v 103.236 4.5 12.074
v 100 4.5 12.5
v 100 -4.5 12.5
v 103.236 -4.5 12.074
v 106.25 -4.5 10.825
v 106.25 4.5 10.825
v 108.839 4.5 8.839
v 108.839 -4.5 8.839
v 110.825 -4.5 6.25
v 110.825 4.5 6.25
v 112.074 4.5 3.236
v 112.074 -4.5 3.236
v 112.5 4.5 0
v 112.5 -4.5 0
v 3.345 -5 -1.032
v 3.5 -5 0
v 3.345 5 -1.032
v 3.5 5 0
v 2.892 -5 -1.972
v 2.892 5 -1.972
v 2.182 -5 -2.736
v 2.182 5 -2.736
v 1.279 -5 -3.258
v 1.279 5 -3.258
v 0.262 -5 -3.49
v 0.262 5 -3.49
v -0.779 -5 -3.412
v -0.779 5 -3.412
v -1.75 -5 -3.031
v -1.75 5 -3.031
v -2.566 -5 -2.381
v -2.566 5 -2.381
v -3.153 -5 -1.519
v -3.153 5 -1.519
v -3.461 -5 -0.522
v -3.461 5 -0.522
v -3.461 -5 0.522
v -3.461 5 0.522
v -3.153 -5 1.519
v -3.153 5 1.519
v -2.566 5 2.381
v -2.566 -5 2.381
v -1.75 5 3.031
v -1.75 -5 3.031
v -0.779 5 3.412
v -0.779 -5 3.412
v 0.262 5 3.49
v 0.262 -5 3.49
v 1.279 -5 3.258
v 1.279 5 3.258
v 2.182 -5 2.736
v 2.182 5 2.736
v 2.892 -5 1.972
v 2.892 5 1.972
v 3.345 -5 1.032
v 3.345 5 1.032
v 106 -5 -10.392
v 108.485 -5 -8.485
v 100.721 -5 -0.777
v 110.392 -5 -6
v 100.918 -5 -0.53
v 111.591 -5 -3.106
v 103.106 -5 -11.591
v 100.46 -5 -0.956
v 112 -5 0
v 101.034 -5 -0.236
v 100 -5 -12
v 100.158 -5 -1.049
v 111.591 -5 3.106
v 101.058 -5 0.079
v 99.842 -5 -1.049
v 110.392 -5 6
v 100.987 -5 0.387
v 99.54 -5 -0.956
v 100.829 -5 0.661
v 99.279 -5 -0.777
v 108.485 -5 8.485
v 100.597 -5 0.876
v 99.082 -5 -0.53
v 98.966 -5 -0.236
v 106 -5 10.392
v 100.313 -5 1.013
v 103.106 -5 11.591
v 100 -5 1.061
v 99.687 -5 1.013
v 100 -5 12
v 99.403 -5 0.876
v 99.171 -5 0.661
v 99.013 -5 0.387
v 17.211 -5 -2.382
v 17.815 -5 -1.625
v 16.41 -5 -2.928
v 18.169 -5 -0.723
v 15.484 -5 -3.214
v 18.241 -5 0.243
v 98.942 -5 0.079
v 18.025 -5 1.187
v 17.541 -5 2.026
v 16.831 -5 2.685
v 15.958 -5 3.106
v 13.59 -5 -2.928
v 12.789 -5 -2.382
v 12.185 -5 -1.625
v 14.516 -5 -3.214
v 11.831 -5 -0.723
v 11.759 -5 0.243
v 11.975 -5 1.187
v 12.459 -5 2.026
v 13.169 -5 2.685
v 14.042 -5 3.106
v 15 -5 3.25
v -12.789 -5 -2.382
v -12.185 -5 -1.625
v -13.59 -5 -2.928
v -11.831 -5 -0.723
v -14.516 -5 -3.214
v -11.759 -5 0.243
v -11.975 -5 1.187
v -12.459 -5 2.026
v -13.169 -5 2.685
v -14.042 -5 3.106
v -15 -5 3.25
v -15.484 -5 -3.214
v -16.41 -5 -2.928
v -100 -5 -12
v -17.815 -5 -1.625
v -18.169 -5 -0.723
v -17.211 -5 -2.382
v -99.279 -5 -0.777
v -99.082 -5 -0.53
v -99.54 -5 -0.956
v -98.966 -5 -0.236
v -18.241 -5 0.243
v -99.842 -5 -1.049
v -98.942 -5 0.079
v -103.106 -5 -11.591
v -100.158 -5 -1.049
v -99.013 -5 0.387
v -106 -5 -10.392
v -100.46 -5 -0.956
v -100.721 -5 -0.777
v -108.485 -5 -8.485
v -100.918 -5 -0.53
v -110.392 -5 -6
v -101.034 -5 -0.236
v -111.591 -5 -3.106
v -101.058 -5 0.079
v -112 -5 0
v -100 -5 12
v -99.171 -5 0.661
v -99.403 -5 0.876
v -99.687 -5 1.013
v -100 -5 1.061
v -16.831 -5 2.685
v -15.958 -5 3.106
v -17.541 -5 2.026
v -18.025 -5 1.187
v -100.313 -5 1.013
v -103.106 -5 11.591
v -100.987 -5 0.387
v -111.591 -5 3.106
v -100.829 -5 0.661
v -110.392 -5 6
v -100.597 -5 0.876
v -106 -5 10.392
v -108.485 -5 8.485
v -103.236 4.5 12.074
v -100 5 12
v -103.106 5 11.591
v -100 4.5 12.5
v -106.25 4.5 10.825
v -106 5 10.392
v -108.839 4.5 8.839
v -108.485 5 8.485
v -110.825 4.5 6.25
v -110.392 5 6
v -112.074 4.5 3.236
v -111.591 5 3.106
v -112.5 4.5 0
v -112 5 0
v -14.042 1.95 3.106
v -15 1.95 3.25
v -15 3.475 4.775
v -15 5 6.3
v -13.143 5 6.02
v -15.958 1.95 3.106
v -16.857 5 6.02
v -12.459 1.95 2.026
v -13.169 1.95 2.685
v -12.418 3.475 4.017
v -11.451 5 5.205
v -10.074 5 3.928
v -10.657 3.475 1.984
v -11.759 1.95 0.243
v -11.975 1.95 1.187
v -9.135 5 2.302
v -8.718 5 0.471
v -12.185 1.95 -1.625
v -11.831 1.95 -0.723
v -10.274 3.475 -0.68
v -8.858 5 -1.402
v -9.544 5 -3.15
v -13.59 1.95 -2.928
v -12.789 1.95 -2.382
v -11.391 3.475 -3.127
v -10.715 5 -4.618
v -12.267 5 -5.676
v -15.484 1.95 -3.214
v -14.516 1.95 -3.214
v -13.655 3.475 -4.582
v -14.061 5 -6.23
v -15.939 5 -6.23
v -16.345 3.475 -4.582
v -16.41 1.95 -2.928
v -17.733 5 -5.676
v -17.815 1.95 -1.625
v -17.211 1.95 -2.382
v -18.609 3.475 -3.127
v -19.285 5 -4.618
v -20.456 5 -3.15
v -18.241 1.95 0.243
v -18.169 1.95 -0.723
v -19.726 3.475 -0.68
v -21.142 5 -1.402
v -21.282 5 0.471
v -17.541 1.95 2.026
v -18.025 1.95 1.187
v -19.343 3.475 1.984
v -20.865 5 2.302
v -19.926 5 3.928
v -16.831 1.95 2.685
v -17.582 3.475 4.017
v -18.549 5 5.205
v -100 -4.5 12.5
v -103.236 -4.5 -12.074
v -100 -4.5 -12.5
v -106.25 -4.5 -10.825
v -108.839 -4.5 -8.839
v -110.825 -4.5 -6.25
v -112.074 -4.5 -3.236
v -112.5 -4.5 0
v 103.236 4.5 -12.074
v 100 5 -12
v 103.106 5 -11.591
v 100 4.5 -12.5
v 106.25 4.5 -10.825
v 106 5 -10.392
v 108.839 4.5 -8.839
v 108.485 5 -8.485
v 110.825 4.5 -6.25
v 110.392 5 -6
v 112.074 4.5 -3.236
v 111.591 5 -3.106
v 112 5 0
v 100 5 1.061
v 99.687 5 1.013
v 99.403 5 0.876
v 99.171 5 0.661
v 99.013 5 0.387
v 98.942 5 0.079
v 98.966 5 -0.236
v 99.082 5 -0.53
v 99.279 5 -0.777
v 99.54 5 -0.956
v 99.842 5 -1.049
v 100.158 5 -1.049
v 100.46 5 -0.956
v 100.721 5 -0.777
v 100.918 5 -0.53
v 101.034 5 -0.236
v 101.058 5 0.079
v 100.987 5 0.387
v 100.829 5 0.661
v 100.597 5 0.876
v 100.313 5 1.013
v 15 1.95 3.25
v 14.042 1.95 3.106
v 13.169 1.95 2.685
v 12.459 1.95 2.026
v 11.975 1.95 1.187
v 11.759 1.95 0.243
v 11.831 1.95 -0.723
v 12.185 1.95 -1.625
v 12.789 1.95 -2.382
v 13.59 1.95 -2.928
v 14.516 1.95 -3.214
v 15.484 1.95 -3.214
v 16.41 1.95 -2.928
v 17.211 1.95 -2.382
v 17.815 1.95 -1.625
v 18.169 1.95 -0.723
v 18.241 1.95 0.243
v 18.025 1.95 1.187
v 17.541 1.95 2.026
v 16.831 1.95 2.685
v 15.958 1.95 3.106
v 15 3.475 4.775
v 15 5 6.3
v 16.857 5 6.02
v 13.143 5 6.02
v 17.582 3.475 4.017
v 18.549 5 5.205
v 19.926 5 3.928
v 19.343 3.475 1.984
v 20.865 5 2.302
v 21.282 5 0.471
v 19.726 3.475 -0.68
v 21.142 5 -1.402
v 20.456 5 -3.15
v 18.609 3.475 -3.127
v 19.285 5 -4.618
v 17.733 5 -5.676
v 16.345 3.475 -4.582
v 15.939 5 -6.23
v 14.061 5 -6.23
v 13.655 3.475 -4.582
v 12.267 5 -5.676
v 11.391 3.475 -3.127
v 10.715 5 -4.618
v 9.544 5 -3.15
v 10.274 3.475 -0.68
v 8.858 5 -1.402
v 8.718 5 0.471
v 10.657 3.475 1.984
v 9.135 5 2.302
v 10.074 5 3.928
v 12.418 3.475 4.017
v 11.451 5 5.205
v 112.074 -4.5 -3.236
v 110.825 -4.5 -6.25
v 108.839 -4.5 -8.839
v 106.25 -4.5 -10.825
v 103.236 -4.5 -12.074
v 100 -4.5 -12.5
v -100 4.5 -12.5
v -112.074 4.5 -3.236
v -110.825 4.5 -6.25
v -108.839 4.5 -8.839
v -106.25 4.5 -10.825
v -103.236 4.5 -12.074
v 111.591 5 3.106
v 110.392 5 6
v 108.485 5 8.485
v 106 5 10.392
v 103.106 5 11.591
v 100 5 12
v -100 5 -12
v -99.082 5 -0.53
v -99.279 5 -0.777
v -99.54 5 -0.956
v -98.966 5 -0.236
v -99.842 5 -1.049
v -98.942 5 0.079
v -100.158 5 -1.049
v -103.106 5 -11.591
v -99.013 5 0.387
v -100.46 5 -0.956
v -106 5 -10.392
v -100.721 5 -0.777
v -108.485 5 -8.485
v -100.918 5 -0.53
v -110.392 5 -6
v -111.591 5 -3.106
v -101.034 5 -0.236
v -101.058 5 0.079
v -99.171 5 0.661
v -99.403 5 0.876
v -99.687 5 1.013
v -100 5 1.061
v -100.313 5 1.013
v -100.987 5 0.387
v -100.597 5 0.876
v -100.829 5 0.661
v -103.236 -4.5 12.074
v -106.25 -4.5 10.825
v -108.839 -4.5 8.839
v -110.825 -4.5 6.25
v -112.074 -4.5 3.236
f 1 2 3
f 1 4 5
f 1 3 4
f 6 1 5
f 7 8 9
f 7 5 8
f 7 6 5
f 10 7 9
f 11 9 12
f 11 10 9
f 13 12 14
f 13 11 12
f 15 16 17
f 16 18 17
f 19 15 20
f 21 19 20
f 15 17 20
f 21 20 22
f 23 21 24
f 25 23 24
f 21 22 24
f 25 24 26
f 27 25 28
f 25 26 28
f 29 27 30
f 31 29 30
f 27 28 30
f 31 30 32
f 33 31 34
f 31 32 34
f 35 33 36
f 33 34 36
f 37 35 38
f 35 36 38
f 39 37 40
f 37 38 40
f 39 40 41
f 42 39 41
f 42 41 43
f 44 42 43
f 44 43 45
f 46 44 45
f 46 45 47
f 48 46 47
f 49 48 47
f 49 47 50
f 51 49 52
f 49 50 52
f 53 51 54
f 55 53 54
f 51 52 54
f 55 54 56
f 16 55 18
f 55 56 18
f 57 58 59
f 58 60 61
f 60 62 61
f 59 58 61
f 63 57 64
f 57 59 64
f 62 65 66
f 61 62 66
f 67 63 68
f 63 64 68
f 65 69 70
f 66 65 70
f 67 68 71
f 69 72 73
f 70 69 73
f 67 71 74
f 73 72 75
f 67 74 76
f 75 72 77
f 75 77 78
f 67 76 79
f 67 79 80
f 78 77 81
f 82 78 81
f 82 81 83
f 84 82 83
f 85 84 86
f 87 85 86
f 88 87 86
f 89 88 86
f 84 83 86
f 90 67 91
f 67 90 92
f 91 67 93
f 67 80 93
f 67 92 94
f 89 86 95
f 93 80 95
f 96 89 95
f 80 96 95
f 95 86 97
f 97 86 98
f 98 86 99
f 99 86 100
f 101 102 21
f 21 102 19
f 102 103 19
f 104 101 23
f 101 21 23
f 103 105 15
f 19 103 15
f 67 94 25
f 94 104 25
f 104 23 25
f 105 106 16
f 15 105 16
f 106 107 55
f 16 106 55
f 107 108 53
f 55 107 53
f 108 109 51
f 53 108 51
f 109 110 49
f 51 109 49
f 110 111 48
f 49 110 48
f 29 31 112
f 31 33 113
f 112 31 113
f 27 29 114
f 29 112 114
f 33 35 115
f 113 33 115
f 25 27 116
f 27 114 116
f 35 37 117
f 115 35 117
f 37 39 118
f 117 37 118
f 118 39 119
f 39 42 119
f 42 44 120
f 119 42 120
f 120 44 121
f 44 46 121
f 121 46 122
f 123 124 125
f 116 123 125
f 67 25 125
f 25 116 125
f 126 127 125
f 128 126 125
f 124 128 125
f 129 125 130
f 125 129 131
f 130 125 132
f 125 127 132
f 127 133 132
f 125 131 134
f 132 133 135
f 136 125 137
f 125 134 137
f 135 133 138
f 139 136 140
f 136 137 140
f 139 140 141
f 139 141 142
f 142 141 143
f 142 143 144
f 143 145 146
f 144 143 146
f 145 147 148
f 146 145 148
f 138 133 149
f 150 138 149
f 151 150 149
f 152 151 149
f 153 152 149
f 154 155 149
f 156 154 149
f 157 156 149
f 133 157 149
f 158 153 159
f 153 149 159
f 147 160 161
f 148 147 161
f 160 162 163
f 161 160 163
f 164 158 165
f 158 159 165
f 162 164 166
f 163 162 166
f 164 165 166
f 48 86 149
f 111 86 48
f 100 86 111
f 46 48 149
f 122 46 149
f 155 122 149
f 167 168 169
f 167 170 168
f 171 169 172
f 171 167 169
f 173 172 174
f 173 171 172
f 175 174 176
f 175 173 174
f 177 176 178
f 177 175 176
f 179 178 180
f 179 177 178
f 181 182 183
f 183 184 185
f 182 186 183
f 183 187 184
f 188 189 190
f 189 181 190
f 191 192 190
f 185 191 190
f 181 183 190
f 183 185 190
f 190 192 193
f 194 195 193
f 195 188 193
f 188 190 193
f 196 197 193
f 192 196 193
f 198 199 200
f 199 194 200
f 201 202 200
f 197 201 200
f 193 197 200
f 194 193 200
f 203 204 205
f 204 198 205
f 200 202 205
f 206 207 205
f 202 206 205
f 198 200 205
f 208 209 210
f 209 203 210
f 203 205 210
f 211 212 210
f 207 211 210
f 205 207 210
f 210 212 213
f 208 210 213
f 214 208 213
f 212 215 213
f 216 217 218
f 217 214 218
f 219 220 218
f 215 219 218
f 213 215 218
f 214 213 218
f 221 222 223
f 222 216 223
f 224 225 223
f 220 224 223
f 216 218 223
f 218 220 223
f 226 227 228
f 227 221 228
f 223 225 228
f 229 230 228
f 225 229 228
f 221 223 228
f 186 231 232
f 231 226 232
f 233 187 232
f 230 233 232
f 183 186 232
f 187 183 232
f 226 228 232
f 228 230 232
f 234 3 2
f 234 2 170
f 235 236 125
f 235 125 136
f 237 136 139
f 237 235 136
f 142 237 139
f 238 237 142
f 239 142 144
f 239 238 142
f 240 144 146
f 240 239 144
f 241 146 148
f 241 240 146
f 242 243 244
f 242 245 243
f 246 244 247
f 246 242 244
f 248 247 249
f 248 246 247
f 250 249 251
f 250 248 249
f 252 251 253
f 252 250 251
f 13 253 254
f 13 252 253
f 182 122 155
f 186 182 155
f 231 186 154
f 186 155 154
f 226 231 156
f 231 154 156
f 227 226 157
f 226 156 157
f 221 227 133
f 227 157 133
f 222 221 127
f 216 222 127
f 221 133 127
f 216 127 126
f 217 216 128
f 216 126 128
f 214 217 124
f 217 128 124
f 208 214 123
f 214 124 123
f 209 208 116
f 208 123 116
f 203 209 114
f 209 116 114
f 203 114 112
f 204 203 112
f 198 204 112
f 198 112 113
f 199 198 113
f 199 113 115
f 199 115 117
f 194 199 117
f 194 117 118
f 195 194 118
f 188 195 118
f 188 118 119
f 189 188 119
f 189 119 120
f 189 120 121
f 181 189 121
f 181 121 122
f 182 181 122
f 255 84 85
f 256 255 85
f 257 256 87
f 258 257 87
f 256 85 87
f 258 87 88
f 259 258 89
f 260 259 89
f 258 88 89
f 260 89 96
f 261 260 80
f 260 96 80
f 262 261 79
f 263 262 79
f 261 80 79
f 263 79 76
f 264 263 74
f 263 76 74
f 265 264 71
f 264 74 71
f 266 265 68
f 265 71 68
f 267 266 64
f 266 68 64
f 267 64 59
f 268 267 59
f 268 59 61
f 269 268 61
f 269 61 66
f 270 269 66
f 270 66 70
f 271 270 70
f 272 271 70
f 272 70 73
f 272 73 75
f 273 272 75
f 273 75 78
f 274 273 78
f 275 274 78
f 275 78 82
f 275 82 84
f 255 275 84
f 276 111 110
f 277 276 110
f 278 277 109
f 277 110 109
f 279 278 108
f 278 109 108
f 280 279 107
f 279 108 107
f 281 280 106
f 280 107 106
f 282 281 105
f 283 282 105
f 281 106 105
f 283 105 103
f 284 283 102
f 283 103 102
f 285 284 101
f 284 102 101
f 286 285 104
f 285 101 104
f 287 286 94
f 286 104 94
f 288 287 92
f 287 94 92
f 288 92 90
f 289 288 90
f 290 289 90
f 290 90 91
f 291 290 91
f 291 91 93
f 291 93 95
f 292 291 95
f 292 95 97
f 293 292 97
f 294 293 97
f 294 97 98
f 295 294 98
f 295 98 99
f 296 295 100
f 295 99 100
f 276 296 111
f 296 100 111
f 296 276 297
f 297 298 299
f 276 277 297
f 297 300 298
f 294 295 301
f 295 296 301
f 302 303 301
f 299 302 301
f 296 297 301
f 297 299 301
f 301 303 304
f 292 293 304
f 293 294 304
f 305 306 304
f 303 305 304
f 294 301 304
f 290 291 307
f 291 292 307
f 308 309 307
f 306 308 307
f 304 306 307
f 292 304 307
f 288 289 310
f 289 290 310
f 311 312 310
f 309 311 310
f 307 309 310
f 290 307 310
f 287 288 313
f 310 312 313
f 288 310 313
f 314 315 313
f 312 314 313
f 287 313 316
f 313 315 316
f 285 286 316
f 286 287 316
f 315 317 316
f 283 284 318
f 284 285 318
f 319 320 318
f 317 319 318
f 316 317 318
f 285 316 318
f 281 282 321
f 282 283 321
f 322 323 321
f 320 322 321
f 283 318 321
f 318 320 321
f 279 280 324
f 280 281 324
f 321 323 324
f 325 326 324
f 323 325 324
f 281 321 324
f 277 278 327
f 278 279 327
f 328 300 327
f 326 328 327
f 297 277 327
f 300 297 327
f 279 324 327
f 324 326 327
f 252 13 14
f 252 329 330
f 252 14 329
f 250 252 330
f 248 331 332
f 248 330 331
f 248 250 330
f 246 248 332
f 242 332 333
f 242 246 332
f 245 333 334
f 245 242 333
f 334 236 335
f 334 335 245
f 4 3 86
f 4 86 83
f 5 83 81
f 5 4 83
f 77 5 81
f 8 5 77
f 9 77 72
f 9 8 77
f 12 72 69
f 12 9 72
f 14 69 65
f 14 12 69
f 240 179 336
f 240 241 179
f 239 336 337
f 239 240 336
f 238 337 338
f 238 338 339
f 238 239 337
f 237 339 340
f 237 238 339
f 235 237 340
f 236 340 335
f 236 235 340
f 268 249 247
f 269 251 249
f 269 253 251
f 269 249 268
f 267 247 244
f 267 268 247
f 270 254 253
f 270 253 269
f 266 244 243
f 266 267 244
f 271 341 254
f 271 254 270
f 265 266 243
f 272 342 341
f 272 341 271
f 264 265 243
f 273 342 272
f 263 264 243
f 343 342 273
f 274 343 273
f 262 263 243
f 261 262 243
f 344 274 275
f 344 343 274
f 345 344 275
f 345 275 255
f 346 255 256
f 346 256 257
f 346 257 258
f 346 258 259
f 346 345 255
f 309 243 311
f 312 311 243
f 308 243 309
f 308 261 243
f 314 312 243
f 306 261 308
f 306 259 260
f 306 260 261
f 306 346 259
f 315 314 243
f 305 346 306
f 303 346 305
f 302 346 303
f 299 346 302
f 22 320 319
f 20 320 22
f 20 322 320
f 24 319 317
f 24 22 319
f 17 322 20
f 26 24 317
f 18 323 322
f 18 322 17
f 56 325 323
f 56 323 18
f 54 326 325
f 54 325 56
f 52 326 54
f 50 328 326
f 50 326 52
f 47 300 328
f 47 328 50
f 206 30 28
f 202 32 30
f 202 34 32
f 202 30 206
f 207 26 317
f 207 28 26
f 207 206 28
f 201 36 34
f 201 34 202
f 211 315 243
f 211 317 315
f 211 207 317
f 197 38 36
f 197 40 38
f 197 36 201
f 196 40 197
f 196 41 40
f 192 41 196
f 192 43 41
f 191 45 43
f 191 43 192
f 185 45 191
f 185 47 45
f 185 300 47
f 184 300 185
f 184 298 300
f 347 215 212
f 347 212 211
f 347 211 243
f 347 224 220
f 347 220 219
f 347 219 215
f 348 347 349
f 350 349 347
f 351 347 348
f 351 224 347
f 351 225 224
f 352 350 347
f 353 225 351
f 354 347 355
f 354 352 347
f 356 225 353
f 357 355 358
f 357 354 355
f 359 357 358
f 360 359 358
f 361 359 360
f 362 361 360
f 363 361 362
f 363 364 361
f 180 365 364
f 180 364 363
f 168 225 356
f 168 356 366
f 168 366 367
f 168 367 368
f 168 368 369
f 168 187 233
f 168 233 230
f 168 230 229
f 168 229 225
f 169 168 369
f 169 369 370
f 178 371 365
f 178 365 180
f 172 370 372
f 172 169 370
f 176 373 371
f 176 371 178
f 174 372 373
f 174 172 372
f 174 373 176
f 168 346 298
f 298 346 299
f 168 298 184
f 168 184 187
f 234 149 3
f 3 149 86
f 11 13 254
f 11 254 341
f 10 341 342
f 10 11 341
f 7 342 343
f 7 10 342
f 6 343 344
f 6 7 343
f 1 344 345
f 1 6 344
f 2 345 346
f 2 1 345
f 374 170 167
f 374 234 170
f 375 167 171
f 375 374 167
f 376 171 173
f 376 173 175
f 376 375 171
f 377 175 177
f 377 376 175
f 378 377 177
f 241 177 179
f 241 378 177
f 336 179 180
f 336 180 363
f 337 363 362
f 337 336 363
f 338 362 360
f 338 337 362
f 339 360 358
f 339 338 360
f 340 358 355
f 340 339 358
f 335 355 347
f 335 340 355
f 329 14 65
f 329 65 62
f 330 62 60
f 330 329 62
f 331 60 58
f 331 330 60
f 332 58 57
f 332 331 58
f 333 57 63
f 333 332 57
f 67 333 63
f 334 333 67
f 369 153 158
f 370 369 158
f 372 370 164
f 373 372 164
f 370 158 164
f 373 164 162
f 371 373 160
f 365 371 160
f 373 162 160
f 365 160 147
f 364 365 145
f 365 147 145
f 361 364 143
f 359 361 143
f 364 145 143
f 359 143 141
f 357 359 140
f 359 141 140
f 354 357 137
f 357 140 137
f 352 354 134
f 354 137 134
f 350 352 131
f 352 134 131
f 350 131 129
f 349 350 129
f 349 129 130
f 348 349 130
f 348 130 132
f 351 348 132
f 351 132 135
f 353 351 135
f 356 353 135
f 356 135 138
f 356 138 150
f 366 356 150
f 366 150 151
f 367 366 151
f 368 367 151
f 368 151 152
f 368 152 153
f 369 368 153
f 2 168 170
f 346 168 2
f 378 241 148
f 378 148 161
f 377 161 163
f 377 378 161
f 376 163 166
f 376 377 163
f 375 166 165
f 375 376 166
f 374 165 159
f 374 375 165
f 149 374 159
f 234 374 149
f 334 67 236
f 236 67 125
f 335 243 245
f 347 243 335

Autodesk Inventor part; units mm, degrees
ref_plane "YZ Plane" through (0, 0, 0) normal (1, 0, 0) x (0, 1, 0)
ref_plane "XZ Plane" through (0, 0, 0) normal (0, 1, 0) x (-1, 0, 0)
ref_plane "XY Plane" through (0, 0, 0) normal (0, 0, 1) x (1, 0, 0)
sketch "Sketch1" plane through (0, 0, 0) normal (0, 1, 0) x (-1, 0, 0)
  line L0 (-112.5, 12.5) -> (112.5, 12.5)
  line L1 (112.5, 12.5) -> (112.5, -12.5)
  line L2 (112.5, -12.5) -> (-112.5, -12.5)
  line L3 (-112.5, -12.5) -> (-112.5, 12.5)
  line L4 (-112.5, 12.5) -> (112.5, -12.5) construction
  line L5 (112.5, 12.5) -> (-112.5, -12.5) construction
  point P0 (0, 0)
  dimension "Length" = 225
  dimension "Width" = 25
extrude "Extrusion1" add sketch "Sketch1" along normal mid plane 10
sketch "Sketch2" plane through (0, 5, 0) normal (0, 1, 0) x (1, 0, 0)
  circle A0 centre (0, 0) radius 3.5
  dimension "d4" = 7
extrude "Extrusion2" cut sketch "Sketch2" against normal up to surface (10 mm away)
sketch "Sketch3" plane through (0, 5, 0) normal (0, 1, 0) x (1, 0, 0)
  circle A0 centre (0, 0) radius 3.5 projected
  point P0 (-15, 0)
  point P1 (15, 0)
  dimension "d7" = 30
  dimension "d8" = 15
hole "Hole1" at (-15, 5, 0) at (15, 5, 0) direction (0, -1, 0) diameter 6.5 end through all countersink diameter 12.6 countersink angle 90
sketch "Sketch4" plane through (0, 5, 0) normal (0, 1, 0) x (1, 0, 0)
  point P0 (0, 0)
  point P1 (-100, 0)
  point P2 (100, 0)
  dimension "d16" = 200
  dimension "d17" = 100
hole "Hole2" at (-100, 5, 0) at (100, 5, 0) direction (0, -1, 0) diameter 2.1211 end through all thread size "M2.5x0.35" class "6H" standard "ISO Metric profile"
fillet "Fillet1" radius 12.5 4 edges at (112.5, 0, 12.5) (112.5, 0, -12.5) (-112.5, 0, 12.5) (-112.5, 0, -12.5)
chamfer "Chamfer1" distance 0.5 angle 45 8 edges at (0, 5, 12.5) (108.839, 5, 8.839) (0, 5, -12.5) (-108.839, 5, 8.839) (0, -5, 12.5) (-108.839, -5, 8.839) (0, -5, -12.5) (108.839, -5, 8.839)
equation "\"d8\" = 0.5 * d7"
equation "\"d17\" = 0.5 * d16"
properties part number "Brass Plate" material "Brass, Soft Yellow"
